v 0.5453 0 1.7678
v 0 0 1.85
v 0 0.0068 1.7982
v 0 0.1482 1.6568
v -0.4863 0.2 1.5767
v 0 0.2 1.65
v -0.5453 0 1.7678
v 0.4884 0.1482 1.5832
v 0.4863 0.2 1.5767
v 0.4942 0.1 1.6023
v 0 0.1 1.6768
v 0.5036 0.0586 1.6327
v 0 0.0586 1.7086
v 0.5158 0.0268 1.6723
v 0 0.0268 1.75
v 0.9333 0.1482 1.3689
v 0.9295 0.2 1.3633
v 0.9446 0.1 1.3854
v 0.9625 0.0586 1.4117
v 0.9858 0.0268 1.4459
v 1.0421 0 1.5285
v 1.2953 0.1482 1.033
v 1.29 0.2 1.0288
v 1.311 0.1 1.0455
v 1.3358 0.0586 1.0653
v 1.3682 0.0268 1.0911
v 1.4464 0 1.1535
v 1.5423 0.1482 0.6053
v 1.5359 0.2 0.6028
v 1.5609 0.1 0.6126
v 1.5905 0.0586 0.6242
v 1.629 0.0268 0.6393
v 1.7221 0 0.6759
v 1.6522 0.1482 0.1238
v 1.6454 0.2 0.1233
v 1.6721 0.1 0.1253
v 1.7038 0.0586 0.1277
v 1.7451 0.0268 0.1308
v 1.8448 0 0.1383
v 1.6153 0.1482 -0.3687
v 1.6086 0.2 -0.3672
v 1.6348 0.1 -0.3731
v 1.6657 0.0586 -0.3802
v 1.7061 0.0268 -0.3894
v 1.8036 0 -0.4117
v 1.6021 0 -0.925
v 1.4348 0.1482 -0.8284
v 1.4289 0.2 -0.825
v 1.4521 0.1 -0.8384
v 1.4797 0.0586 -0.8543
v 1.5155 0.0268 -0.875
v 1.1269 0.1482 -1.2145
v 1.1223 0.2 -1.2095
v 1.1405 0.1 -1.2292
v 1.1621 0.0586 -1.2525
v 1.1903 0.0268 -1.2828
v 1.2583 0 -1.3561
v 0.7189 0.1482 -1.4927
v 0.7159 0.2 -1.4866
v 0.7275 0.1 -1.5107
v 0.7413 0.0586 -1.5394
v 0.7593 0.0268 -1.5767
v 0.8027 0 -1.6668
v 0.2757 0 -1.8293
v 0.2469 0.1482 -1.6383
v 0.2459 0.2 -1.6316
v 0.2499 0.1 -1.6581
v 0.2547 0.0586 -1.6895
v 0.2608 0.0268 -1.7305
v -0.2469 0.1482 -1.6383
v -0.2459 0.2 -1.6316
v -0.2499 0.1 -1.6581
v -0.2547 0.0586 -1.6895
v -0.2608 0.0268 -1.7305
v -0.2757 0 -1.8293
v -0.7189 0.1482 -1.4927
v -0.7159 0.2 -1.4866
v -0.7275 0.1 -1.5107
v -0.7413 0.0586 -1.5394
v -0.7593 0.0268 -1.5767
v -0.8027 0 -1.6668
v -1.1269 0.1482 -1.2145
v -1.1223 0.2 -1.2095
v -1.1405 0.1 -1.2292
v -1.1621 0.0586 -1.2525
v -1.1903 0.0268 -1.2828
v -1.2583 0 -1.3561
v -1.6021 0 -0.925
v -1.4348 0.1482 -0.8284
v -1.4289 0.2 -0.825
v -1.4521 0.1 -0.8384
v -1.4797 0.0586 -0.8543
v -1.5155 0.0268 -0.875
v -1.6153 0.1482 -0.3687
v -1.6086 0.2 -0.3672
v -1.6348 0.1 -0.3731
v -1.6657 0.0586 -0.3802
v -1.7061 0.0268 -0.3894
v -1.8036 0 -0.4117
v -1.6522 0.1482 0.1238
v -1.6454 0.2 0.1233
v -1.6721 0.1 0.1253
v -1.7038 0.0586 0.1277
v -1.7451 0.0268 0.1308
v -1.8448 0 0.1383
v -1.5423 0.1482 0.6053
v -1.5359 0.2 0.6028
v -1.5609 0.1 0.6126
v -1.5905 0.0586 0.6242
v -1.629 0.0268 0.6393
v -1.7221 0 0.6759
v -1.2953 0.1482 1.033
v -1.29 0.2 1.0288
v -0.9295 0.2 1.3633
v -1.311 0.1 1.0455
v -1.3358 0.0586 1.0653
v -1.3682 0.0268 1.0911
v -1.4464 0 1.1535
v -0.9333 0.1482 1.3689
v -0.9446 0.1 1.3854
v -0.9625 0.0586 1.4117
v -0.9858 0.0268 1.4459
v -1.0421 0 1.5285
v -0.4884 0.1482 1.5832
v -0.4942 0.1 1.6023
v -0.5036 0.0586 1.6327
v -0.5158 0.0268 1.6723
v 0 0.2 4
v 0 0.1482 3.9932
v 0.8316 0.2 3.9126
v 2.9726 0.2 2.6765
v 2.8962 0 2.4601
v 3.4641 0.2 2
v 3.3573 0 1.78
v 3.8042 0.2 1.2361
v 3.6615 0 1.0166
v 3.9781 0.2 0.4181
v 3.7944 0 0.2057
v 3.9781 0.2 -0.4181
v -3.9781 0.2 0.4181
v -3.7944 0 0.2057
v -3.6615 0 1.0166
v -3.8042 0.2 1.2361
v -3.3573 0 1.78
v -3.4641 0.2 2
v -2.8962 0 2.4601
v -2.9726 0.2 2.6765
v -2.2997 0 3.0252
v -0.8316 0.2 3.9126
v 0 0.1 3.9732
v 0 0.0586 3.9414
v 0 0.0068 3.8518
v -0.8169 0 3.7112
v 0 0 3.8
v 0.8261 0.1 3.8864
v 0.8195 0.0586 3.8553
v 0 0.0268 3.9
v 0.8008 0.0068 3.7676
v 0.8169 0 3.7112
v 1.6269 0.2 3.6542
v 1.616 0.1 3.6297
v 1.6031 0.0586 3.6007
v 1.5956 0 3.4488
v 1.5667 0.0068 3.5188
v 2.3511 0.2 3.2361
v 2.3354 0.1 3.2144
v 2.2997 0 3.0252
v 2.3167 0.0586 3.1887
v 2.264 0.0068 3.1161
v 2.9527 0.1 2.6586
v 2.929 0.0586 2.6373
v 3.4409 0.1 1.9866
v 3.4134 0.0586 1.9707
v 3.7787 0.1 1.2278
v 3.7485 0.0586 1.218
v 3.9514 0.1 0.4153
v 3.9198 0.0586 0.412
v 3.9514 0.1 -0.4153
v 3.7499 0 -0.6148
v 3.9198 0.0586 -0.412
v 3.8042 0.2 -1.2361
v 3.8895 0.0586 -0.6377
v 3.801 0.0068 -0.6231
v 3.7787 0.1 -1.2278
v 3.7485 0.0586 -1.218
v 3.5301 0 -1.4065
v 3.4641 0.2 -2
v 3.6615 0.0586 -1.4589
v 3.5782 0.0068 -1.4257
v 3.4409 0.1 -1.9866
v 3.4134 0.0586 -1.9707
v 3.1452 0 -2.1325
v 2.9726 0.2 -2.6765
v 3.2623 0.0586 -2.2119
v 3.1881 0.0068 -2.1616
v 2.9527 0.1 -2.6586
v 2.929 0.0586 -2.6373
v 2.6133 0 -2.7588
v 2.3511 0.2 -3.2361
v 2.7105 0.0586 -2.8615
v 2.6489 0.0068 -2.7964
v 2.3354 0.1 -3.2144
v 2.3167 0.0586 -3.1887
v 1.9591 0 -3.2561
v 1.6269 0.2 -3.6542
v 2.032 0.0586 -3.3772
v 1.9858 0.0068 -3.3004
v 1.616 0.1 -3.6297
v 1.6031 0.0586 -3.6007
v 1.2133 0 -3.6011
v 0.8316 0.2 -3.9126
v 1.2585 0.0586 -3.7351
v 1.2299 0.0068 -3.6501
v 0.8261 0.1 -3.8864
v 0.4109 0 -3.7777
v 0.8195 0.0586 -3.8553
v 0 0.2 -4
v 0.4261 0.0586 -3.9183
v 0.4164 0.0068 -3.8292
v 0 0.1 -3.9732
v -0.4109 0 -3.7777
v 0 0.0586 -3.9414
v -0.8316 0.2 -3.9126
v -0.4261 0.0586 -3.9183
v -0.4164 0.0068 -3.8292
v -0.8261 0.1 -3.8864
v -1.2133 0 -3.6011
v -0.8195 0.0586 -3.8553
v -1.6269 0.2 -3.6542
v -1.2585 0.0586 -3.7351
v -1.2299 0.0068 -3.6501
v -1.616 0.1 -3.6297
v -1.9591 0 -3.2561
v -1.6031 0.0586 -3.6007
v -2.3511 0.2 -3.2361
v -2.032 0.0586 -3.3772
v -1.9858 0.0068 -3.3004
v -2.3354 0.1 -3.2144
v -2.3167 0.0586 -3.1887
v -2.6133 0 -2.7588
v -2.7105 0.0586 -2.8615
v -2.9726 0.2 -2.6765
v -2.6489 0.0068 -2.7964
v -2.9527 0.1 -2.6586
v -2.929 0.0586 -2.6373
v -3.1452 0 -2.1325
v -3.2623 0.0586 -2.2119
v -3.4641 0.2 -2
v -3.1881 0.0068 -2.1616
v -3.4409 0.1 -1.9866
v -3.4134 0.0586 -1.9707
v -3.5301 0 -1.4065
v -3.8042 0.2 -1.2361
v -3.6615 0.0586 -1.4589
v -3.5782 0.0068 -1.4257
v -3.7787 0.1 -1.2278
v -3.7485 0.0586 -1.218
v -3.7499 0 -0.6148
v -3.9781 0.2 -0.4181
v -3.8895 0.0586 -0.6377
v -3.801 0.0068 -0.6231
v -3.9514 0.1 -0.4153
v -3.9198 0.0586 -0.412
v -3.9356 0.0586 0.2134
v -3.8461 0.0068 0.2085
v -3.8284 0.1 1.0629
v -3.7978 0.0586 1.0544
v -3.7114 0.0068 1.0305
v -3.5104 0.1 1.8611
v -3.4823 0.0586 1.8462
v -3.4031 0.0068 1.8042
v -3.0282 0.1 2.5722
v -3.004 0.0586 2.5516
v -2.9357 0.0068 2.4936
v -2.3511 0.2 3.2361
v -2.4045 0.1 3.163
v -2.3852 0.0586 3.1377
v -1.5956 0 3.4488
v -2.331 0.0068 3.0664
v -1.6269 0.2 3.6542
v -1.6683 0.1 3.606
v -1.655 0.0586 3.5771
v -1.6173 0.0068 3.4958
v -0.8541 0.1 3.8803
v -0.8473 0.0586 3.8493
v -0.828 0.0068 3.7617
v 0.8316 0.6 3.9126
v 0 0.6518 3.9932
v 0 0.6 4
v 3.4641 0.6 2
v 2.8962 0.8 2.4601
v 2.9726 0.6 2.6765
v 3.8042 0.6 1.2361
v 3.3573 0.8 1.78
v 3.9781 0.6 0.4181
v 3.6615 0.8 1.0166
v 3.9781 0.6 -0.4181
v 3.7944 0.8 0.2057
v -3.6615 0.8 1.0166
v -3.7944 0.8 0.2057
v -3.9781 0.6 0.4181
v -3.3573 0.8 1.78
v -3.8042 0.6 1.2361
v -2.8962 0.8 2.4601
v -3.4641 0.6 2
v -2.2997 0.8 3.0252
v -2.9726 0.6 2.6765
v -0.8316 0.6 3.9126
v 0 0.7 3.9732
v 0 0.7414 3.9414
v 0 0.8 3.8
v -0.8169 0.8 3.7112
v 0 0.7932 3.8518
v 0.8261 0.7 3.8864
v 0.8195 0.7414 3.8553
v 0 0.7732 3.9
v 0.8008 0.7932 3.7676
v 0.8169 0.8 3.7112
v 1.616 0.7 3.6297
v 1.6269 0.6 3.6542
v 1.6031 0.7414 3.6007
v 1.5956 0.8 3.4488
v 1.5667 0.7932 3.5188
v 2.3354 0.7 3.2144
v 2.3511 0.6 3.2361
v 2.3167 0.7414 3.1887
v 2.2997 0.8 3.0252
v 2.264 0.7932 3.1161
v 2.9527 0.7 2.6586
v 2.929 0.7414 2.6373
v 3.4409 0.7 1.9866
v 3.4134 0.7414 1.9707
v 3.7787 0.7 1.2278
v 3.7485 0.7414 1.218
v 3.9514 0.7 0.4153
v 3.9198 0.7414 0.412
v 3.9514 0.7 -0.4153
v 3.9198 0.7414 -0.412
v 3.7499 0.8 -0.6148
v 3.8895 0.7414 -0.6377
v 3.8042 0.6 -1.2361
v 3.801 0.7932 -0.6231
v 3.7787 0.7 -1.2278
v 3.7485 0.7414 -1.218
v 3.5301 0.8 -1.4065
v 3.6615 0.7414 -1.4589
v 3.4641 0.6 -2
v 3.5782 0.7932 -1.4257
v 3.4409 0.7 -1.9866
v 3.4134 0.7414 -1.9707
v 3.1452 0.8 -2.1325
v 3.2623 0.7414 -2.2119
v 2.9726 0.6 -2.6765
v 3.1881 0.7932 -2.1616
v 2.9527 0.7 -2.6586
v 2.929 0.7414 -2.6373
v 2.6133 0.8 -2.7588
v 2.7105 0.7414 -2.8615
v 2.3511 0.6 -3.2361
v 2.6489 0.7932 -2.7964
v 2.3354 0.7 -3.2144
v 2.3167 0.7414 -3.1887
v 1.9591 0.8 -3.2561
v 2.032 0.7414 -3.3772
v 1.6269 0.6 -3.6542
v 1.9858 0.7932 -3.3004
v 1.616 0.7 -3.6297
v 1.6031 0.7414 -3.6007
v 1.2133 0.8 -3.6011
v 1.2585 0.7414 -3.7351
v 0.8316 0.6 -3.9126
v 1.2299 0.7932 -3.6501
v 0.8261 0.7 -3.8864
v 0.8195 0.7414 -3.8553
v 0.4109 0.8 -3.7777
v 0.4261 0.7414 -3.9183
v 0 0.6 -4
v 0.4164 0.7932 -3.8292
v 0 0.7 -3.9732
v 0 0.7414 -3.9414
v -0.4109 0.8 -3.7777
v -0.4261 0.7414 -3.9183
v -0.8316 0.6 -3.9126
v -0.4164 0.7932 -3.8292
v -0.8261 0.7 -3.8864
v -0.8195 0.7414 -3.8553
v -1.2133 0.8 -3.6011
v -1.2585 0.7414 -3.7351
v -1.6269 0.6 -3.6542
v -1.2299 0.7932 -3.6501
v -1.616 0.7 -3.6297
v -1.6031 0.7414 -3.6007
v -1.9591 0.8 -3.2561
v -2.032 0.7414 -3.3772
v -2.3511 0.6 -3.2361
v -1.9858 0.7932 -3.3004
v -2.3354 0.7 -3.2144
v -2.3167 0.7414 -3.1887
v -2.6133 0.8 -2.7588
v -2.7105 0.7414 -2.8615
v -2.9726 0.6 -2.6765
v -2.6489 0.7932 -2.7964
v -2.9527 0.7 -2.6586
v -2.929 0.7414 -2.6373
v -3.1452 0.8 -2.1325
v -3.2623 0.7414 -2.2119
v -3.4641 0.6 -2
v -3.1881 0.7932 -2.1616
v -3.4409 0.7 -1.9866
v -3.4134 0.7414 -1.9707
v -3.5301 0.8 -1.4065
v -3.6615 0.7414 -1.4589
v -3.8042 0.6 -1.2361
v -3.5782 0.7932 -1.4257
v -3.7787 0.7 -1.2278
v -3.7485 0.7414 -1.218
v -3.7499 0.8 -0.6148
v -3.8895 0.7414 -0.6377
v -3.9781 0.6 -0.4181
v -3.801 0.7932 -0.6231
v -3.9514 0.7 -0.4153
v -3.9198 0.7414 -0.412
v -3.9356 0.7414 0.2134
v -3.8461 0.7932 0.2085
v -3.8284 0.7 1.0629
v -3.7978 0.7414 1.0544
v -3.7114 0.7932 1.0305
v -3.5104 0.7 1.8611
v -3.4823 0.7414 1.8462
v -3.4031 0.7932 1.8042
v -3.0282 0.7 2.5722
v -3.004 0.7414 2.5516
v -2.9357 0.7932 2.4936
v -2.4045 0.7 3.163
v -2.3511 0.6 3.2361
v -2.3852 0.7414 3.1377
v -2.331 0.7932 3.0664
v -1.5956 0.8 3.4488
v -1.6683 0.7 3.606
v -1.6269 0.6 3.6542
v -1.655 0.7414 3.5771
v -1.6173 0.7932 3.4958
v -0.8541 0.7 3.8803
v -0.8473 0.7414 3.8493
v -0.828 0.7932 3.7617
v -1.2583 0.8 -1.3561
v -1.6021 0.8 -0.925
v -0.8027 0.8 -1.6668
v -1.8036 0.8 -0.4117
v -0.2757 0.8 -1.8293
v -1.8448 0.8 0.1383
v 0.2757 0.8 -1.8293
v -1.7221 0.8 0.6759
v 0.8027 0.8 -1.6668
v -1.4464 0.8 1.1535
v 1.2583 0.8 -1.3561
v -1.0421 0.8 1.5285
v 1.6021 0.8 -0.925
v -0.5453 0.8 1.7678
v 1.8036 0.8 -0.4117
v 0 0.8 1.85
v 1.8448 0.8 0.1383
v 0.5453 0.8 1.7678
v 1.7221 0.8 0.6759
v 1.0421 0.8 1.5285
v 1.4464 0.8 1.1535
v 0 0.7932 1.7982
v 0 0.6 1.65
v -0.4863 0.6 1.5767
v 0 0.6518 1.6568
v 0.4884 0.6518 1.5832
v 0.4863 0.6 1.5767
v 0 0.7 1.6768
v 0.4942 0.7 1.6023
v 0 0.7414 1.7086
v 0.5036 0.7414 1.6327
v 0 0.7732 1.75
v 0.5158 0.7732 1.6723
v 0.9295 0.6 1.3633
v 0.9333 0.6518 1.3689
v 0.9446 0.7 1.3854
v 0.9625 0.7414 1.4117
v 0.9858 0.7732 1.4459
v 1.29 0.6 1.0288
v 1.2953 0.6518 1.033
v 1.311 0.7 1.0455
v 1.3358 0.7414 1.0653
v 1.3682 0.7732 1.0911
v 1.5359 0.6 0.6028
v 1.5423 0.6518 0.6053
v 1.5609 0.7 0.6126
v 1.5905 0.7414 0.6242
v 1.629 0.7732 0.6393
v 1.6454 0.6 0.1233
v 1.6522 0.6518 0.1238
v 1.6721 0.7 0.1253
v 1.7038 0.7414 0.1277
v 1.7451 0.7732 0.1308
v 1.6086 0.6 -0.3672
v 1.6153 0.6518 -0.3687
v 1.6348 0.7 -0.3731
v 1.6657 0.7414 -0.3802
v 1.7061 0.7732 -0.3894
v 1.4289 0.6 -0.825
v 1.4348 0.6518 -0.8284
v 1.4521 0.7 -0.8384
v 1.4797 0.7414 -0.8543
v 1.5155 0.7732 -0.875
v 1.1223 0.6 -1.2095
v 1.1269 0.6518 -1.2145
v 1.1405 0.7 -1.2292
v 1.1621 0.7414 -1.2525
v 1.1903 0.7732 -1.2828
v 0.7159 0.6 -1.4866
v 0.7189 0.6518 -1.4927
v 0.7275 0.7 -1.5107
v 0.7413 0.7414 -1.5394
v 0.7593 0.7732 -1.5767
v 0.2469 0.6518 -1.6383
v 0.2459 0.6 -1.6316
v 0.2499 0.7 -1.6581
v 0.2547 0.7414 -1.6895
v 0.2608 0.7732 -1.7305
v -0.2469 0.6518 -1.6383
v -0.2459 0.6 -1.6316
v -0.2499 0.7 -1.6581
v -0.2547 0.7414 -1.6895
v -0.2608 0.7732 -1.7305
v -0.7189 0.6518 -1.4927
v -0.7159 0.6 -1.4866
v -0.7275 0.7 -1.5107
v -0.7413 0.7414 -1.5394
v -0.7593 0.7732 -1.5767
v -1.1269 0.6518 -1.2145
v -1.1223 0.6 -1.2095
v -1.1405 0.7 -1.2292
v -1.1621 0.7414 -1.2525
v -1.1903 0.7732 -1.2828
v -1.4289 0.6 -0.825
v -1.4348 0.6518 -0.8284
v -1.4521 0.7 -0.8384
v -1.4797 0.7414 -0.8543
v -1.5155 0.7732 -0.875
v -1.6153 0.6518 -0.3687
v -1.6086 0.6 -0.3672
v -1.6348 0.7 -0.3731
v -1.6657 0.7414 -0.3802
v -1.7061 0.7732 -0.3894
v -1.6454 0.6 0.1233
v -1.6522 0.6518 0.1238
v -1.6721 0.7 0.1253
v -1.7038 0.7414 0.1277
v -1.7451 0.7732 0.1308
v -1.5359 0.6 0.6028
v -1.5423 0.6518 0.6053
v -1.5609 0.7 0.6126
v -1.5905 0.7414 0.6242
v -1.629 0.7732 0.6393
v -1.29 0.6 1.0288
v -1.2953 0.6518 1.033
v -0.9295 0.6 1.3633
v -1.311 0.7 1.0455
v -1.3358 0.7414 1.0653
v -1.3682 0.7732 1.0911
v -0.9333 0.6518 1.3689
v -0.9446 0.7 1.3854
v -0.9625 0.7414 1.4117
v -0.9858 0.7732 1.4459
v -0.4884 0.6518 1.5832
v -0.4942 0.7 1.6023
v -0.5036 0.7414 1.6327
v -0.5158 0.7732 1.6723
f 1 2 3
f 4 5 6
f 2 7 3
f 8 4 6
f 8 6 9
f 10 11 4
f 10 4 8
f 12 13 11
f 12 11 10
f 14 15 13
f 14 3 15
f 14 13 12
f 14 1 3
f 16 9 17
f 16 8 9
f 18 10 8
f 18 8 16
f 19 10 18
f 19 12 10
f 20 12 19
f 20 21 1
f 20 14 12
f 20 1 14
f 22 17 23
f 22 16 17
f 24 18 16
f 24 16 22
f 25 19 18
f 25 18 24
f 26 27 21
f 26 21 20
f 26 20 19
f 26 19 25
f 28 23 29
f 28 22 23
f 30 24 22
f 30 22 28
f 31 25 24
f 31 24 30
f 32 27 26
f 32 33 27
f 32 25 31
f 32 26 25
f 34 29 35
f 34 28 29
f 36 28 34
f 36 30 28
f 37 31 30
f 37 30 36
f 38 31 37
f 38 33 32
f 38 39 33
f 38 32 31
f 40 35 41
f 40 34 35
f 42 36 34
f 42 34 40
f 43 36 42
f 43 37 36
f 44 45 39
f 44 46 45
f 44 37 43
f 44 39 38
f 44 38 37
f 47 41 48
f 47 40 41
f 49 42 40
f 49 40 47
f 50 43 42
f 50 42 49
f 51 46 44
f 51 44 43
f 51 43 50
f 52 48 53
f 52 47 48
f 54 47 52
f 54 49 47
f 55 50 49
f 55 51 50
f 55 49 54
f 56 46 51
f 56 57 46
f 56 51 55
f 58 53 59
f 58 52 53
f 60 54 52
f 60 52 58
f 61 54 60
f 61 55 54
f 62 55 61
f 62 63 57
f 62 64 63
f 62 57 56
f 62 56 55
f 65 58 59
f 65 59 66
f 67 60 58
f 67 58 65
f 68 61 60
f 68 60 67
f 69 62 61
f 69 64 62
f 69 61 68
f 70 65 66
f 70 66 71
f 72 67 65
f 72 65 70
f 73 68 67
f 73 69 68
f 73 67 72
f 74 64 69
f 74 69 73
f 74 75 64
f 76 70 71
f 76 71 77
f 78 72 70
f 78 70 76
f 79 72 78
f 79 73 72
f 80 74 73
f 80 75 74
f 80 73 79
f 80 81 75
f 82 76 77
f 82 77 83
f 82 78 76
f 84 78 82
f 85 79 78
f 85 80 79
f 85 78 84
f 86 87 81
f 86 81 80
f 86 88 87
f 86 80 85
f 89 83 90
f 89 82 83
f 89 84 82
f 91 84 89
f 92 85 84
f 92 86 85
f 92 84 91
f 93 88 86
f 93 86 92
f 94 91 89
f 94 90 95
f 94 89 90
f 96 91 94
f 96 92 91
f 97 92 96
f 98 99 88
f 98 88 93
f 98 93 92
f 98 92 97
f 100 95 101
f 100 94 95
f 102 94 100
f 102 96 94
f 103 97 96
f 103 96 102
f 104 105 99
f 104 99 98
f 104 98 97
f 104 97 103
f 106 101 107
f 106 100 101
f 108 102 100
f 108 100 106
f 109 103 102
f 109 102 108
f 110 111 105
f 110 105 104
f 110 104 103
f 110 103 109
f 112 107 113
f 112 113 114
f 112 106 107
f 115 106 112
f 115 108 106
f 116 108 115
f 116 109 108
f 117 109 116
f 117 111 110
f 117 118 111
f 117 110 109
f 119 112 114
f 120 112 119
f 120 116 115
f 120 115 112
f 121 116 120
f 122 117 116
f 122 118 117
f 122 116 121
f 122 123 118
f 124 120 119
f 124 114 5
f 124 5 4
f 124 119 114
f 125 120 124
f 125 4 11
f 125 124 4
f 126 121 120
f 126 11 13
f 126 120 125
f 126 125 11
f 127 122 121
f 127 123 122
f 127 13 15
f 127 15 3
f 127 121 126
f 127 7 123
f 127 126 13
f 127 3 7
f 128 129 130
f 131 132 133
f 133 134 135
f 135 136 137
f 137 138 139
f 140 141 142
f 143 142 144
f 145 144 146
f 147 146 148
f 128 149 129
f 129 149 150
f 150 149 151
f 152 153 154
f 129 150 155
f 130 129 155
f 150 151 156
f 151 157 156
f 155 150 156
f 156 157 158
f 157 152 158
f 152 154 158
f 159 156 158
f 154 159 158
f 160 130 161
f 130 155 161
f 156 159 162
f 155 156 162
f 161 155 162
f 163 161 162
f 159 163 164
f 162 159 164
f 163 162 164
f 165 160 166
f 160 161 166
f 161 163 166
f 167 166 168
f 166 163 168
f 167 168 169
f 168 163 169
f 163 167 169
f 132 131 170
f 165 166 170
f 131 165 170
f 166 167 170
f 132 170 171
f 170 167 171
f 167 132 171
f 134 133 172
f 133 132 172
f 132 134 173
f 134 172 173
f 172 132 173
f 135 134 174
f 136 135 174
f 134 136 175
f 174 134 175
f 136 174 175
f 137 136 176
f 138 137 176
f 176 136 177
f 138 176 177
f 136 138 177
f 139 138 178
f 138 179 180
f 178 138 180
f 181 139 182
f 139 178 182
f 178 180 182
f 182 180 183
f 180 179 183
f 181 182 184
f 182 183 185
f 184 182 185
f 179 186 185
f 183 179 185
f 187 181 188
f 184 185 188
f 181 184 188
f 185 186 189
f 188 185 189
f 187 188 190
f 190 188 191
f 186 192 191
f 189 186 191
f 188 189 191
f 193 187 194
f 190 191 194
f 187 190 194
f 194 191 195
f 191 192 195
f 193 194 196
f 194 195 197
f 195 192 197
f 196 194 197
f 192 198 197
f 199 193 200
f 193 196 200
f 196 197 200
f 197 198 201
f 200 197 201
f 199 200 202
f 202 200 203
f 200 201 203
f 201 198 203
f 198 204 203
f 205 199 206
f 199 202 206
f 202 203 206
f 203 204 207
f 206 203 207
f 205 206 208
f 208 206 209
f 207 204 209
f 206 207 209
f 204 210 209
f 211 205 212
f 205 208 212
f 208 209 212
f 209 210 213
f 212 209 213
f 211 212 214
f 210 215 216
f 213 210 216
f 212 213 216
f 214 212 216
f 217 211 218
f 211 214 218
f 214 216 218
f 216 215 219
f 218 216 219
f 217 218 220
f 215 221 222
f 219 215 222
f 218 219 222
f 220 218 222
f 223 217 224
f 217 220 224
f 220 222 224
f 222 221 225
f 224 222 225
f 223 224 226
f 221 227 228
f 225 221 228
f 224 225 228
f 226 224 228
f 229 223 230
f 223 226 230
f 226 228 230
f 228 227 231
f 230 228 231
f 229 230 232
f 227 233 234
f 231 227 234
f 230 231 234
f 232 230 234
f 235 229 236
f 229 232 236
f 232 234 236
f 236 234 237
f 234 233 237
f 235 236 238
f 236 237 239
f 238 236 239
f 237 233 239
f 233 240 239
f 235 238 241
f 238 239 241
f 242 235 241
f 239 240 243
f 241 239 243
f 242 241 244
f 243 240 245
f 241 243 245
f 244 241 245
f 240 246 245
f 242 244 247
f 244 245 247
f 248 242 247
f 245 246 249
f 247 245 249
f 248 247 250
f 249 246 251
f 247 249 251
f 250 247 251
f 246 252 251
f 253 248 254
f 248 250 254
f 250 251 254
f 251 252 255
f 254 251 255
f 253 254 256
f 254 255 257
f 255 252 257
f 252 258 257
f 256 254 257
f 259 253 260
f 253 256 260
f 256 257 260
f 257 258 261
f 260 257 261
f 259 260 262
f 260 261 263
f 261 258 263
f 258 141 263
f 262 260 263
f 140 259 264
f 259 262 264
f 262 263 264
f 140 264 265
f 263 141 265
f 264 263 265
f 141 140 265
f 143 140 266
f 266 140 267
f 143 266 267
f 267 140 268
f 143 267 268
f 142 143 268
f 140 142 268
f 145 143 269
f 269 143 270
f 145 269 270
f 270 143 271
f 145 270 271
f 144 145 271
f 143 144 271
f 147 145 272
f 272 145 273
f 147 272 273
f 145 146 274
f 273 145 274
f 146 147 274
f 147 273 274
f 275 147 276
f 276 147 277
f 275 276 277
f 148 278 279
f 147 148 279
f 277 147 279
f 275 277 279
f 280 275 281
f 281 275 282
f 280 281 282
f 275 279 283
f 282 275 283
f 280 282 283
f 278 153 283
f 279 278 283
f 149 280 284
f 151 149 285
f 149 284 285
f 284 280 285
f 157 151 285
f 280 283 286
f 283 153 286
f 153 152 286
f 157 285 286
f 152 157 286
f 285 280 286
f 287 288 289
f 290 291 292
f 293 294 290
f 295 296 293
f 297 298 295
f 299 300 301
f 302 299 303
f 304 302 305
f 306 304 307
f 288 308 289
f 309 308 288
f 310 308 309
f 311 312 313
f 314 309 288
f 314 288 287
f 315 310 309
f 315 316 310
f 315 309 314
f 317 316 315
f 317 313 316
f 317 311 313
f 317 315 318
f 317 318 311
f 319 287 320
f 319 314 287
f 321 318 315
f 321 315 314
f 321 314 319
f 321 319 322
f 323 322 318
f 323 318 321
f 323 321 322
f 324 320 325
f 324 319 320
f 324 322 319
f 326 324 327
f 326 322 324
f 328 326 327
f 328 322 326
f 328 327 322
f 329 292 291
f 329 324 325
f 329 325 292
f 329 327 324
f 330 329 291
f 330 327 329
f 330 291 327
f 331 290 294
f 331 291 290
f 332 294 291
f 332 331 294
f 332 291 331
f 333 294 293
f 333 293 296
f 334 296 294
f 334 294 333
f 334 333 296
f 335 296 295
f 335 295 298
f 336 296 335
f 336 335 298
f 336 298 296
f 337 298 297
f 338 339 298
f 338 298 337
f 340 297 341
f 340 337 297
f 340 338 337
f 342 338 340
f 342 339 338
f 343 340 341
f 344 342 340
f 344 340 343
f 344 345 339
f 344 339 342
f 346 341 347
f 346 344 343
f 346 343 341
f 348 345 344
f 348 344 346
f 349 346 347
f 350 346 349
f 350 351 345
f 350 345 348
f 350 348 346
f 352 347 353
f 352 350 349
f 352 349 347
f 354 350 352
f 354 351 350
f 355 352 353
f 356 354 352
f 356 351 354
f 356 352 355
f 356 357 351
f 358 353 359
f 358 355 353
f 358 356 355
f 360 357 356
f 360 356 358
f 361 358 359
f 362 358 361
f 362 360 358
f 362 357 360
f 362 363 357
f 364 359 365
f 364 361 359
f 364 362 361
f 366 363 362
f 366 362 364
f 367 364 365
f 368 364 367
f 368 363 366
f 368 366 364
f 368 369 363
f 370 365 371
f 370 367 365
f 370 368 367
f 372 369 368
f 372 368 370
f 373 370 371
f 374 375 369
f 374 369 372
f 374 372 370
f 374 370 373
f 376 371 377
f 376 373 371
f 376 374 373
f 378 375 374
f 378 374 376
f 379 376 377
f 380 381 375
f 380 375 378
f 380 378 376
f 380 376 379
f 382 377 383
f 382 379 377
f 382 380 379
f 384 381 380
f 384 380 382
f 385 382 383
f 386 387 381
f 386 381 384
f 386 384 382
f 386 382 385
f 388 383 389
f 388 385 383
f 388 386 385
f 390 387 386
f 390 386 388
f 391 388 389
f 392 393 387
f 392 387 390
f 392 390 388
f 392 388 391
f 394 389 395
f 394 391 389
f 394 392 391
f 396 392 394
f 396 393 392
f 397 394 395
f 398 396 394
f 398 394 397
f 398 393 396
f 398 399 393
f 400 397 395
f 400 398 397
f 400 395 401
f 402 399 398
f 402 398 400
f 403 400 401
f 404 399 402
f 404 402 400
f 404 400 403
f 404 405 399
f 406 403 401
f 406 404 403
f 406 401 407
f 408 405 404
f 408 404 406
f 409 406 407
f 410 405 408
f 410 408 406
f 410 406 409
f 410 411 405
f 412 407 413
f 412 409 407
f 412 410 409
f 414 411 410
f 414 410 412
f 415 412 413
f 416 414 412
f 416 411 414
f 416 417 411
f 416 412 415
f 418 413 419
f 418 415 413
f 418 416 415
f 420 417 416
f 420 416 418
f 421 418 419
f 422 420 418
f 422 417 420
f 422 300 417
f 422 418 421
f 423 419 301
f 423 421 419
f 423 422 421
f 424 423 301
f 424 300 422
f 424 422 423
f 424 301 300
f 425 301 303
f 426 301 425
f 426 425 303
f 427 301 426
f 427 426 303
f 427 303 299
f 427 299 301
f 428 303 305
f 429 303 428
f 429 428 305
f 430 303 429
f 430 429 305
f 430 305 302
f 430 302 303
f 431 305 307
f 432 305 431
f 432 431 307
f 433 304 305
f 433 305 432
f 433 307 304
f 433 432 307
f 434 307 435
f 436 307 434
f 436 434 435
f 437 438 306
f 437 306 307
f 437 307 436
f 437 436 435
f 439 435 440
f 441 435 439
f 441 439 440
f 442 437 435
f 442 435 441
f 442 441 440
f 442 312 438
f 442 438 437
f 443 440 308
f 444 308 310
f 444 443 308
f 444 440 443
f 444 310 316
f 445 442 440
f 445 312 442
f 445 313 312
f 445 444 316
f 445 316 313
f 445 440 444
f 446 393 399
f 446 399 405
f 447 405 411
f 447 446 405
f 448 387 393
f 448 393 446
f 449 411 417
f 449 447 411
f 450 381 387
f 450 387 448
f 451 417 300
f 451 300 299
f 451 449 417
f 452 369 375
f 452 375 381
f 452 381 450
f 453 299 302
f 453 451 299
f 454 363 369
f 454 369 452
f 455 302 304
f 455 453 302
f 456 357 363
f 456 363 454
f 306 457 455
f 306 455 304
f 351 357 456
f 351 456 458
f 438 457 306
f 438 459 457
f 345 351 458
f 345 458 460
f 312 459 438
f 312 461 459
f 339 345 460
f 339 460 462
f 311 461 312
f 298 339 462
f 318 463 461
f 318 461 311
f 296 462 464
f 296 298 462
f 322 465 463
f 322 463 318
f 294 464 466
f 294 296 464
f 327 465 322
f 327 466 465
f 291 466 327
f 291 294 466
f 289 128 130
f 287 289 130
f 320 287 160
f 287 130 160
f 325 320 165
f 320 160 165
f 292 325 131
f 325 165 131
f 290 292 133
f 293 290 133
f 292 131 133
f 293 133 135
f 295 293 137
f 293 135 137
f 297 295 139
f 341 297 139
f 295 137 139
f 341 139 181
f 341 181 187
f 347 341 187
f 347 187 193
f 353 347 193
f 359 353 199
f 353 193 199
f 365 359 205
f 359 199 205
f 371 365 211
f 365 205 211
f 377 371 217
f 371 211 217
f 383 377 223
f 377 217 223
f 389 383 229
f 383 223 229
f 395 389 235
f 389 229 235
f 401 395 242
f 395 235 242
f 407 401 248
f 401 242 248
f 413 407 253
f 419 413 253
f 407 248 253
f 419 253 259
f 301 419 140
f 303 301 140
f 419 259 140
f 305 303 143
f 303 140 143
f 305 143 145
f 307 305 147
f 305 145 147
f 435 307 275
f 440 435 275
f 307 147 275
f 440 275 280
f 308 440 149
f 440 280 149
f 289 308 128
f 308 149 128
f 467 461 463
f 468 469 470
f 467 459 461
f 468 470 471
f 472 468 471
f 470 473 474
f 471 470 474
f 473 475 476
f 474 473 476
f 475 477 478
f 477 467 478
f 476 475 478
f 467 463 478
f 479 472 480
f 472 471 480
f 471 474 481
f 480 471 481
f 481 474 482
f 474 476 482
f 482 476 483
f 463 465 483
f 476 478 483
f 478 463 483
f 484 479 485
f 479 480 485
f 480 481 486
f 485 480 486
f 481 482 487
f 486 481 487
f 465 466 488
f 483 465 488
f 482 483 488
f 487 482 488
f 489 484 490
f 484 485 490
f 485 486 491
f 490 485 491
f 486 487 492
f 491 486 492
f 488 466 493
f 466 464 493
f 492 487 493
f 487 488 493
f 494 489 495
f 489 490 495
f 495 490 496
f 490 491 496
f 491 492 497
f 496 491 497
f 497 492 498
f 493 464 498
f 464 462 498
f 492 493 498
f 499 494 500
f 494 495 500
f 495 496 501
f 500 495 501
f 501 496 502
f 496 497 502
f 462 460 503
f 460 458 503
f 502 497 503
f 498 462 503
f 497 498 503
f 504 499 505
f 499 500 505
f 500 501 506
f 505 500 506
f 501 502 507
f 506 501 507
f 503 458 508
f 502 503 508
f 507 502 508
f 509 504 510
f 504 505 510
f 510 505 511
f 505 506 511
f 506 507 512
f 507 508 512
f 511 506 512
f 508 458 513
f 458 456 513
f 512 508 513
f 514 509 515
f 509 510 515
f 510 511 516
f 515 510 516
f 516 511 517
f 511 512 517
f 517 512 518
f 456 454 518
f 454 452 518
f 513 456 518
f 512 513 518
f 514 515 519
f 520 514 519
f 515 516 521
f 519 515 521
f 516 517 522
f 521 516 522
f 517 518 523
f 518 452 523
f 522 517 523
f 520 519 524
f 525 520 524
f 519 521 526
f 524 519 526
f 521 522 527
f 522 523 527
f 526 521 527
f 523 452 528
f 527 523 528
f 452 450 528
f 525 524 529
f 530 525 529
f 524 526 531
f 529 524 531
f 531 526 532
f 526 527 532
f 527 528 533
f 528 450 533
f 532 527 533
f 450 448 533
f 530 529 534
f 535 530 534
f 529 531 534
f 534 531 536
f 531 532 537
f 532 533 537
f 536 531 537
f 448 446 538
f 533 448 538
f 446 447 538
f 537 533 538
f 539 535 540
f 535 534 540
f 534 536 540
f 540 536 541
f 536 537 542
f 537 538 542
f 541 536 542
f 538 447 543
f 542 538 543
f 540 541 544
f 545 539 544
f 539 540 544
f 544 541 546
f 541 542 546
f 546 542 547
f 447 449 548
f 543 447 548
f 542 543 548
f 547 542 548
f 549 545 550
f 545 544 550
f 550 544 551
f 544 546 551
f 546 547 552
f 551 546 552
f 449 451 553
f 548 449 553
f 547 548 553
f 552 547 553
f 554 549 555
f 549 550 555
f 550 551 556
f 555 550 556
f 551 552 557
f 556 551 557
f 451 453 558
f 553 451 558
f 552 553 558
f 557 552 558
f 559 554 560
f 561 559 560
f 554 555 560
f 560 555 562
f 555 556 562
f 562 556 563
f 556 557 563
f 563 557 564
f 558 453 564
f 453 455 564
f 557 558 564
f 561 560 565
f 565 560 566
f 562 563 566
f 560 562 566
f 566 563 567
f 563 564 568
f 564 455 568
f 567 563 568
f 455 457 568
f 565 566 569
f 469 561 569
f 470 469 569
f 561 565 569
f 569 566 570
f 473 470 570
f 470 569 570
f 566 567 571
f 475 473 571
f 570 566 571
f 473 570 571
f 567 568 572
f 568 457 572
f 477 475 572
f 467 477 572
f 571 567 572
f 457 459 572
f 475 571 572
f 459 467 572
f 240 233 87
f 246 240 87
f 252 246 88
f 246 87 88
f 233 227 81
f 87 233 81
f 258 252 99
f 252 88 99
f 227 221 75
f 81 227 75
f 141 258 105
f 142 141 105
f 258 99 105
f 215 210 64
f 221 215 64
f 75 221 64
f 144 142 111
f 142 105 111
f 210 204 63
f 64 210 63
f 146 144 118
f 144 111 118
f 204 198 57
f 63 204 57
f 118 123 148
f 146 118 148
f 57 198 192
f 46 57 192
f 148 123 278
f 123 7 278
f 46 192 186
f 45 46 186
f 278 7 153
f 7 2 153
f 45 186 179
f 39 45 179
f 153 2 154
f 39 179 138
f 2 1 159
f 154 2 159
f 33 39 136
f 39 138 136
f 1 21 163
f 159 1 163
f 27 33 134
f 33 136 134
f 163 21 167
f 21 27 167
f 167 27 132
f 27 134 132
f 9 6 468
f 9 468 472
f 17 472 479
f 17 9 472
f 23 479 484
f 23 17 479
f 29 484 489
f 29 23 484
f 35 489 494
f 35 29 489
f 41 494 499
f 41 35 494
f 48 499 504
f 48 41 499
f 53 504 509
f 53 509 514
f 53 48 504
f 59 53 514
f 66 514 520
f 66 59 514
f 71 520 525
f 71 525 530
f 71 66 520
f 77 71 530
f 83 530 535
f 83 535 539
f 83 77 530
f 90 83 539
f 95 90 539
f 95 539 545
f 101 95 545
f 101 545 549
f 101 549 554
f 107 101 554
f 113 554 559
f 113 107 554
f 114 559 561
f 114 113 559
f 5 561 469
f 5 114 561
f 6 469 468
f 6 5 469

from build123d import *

# Parameters (mm, degrees)
MAIN_SKETCH_R     = 4
MAIN_SKETCH_R_2   = 1.65
WASHER_MAIN_DEPTH = 0.8
EDGE_FILLETS_R    = 0.2


with BuildPart() as part:
    # Main Sketch → Washer Main (new body)
    with BuildSketch(Plane(origin=(0, 0, 0), x_dir=(1, 0, 0), z_dir=(0, 1, 0))):
        with Locations(Location((0, 0, 0), (0, 0, 270))):
            Circle(MAIN_SKETCH_R)
        with Locations(Location((0, 0, 0), (0, 0, 270))):
            Circle(MAIN_SKETCH_R_2, mode=Mode.SUBTRACT)
    extrude(amount=WASHER_MAIN_DEPTH)

    # Edge Fillets
    edge_fillets_edges = [part.edges().sort_by_distance(p)[0] for p in [
        (0, 0, -4),
        (0, 0.8, -4),
        (0, 0, -1.65),
        (0, 0.8, -1.65),
    ]]
    fillet(edge_fillets_edges, radius=EDGE_FILLETS_R)


solid = part.part
